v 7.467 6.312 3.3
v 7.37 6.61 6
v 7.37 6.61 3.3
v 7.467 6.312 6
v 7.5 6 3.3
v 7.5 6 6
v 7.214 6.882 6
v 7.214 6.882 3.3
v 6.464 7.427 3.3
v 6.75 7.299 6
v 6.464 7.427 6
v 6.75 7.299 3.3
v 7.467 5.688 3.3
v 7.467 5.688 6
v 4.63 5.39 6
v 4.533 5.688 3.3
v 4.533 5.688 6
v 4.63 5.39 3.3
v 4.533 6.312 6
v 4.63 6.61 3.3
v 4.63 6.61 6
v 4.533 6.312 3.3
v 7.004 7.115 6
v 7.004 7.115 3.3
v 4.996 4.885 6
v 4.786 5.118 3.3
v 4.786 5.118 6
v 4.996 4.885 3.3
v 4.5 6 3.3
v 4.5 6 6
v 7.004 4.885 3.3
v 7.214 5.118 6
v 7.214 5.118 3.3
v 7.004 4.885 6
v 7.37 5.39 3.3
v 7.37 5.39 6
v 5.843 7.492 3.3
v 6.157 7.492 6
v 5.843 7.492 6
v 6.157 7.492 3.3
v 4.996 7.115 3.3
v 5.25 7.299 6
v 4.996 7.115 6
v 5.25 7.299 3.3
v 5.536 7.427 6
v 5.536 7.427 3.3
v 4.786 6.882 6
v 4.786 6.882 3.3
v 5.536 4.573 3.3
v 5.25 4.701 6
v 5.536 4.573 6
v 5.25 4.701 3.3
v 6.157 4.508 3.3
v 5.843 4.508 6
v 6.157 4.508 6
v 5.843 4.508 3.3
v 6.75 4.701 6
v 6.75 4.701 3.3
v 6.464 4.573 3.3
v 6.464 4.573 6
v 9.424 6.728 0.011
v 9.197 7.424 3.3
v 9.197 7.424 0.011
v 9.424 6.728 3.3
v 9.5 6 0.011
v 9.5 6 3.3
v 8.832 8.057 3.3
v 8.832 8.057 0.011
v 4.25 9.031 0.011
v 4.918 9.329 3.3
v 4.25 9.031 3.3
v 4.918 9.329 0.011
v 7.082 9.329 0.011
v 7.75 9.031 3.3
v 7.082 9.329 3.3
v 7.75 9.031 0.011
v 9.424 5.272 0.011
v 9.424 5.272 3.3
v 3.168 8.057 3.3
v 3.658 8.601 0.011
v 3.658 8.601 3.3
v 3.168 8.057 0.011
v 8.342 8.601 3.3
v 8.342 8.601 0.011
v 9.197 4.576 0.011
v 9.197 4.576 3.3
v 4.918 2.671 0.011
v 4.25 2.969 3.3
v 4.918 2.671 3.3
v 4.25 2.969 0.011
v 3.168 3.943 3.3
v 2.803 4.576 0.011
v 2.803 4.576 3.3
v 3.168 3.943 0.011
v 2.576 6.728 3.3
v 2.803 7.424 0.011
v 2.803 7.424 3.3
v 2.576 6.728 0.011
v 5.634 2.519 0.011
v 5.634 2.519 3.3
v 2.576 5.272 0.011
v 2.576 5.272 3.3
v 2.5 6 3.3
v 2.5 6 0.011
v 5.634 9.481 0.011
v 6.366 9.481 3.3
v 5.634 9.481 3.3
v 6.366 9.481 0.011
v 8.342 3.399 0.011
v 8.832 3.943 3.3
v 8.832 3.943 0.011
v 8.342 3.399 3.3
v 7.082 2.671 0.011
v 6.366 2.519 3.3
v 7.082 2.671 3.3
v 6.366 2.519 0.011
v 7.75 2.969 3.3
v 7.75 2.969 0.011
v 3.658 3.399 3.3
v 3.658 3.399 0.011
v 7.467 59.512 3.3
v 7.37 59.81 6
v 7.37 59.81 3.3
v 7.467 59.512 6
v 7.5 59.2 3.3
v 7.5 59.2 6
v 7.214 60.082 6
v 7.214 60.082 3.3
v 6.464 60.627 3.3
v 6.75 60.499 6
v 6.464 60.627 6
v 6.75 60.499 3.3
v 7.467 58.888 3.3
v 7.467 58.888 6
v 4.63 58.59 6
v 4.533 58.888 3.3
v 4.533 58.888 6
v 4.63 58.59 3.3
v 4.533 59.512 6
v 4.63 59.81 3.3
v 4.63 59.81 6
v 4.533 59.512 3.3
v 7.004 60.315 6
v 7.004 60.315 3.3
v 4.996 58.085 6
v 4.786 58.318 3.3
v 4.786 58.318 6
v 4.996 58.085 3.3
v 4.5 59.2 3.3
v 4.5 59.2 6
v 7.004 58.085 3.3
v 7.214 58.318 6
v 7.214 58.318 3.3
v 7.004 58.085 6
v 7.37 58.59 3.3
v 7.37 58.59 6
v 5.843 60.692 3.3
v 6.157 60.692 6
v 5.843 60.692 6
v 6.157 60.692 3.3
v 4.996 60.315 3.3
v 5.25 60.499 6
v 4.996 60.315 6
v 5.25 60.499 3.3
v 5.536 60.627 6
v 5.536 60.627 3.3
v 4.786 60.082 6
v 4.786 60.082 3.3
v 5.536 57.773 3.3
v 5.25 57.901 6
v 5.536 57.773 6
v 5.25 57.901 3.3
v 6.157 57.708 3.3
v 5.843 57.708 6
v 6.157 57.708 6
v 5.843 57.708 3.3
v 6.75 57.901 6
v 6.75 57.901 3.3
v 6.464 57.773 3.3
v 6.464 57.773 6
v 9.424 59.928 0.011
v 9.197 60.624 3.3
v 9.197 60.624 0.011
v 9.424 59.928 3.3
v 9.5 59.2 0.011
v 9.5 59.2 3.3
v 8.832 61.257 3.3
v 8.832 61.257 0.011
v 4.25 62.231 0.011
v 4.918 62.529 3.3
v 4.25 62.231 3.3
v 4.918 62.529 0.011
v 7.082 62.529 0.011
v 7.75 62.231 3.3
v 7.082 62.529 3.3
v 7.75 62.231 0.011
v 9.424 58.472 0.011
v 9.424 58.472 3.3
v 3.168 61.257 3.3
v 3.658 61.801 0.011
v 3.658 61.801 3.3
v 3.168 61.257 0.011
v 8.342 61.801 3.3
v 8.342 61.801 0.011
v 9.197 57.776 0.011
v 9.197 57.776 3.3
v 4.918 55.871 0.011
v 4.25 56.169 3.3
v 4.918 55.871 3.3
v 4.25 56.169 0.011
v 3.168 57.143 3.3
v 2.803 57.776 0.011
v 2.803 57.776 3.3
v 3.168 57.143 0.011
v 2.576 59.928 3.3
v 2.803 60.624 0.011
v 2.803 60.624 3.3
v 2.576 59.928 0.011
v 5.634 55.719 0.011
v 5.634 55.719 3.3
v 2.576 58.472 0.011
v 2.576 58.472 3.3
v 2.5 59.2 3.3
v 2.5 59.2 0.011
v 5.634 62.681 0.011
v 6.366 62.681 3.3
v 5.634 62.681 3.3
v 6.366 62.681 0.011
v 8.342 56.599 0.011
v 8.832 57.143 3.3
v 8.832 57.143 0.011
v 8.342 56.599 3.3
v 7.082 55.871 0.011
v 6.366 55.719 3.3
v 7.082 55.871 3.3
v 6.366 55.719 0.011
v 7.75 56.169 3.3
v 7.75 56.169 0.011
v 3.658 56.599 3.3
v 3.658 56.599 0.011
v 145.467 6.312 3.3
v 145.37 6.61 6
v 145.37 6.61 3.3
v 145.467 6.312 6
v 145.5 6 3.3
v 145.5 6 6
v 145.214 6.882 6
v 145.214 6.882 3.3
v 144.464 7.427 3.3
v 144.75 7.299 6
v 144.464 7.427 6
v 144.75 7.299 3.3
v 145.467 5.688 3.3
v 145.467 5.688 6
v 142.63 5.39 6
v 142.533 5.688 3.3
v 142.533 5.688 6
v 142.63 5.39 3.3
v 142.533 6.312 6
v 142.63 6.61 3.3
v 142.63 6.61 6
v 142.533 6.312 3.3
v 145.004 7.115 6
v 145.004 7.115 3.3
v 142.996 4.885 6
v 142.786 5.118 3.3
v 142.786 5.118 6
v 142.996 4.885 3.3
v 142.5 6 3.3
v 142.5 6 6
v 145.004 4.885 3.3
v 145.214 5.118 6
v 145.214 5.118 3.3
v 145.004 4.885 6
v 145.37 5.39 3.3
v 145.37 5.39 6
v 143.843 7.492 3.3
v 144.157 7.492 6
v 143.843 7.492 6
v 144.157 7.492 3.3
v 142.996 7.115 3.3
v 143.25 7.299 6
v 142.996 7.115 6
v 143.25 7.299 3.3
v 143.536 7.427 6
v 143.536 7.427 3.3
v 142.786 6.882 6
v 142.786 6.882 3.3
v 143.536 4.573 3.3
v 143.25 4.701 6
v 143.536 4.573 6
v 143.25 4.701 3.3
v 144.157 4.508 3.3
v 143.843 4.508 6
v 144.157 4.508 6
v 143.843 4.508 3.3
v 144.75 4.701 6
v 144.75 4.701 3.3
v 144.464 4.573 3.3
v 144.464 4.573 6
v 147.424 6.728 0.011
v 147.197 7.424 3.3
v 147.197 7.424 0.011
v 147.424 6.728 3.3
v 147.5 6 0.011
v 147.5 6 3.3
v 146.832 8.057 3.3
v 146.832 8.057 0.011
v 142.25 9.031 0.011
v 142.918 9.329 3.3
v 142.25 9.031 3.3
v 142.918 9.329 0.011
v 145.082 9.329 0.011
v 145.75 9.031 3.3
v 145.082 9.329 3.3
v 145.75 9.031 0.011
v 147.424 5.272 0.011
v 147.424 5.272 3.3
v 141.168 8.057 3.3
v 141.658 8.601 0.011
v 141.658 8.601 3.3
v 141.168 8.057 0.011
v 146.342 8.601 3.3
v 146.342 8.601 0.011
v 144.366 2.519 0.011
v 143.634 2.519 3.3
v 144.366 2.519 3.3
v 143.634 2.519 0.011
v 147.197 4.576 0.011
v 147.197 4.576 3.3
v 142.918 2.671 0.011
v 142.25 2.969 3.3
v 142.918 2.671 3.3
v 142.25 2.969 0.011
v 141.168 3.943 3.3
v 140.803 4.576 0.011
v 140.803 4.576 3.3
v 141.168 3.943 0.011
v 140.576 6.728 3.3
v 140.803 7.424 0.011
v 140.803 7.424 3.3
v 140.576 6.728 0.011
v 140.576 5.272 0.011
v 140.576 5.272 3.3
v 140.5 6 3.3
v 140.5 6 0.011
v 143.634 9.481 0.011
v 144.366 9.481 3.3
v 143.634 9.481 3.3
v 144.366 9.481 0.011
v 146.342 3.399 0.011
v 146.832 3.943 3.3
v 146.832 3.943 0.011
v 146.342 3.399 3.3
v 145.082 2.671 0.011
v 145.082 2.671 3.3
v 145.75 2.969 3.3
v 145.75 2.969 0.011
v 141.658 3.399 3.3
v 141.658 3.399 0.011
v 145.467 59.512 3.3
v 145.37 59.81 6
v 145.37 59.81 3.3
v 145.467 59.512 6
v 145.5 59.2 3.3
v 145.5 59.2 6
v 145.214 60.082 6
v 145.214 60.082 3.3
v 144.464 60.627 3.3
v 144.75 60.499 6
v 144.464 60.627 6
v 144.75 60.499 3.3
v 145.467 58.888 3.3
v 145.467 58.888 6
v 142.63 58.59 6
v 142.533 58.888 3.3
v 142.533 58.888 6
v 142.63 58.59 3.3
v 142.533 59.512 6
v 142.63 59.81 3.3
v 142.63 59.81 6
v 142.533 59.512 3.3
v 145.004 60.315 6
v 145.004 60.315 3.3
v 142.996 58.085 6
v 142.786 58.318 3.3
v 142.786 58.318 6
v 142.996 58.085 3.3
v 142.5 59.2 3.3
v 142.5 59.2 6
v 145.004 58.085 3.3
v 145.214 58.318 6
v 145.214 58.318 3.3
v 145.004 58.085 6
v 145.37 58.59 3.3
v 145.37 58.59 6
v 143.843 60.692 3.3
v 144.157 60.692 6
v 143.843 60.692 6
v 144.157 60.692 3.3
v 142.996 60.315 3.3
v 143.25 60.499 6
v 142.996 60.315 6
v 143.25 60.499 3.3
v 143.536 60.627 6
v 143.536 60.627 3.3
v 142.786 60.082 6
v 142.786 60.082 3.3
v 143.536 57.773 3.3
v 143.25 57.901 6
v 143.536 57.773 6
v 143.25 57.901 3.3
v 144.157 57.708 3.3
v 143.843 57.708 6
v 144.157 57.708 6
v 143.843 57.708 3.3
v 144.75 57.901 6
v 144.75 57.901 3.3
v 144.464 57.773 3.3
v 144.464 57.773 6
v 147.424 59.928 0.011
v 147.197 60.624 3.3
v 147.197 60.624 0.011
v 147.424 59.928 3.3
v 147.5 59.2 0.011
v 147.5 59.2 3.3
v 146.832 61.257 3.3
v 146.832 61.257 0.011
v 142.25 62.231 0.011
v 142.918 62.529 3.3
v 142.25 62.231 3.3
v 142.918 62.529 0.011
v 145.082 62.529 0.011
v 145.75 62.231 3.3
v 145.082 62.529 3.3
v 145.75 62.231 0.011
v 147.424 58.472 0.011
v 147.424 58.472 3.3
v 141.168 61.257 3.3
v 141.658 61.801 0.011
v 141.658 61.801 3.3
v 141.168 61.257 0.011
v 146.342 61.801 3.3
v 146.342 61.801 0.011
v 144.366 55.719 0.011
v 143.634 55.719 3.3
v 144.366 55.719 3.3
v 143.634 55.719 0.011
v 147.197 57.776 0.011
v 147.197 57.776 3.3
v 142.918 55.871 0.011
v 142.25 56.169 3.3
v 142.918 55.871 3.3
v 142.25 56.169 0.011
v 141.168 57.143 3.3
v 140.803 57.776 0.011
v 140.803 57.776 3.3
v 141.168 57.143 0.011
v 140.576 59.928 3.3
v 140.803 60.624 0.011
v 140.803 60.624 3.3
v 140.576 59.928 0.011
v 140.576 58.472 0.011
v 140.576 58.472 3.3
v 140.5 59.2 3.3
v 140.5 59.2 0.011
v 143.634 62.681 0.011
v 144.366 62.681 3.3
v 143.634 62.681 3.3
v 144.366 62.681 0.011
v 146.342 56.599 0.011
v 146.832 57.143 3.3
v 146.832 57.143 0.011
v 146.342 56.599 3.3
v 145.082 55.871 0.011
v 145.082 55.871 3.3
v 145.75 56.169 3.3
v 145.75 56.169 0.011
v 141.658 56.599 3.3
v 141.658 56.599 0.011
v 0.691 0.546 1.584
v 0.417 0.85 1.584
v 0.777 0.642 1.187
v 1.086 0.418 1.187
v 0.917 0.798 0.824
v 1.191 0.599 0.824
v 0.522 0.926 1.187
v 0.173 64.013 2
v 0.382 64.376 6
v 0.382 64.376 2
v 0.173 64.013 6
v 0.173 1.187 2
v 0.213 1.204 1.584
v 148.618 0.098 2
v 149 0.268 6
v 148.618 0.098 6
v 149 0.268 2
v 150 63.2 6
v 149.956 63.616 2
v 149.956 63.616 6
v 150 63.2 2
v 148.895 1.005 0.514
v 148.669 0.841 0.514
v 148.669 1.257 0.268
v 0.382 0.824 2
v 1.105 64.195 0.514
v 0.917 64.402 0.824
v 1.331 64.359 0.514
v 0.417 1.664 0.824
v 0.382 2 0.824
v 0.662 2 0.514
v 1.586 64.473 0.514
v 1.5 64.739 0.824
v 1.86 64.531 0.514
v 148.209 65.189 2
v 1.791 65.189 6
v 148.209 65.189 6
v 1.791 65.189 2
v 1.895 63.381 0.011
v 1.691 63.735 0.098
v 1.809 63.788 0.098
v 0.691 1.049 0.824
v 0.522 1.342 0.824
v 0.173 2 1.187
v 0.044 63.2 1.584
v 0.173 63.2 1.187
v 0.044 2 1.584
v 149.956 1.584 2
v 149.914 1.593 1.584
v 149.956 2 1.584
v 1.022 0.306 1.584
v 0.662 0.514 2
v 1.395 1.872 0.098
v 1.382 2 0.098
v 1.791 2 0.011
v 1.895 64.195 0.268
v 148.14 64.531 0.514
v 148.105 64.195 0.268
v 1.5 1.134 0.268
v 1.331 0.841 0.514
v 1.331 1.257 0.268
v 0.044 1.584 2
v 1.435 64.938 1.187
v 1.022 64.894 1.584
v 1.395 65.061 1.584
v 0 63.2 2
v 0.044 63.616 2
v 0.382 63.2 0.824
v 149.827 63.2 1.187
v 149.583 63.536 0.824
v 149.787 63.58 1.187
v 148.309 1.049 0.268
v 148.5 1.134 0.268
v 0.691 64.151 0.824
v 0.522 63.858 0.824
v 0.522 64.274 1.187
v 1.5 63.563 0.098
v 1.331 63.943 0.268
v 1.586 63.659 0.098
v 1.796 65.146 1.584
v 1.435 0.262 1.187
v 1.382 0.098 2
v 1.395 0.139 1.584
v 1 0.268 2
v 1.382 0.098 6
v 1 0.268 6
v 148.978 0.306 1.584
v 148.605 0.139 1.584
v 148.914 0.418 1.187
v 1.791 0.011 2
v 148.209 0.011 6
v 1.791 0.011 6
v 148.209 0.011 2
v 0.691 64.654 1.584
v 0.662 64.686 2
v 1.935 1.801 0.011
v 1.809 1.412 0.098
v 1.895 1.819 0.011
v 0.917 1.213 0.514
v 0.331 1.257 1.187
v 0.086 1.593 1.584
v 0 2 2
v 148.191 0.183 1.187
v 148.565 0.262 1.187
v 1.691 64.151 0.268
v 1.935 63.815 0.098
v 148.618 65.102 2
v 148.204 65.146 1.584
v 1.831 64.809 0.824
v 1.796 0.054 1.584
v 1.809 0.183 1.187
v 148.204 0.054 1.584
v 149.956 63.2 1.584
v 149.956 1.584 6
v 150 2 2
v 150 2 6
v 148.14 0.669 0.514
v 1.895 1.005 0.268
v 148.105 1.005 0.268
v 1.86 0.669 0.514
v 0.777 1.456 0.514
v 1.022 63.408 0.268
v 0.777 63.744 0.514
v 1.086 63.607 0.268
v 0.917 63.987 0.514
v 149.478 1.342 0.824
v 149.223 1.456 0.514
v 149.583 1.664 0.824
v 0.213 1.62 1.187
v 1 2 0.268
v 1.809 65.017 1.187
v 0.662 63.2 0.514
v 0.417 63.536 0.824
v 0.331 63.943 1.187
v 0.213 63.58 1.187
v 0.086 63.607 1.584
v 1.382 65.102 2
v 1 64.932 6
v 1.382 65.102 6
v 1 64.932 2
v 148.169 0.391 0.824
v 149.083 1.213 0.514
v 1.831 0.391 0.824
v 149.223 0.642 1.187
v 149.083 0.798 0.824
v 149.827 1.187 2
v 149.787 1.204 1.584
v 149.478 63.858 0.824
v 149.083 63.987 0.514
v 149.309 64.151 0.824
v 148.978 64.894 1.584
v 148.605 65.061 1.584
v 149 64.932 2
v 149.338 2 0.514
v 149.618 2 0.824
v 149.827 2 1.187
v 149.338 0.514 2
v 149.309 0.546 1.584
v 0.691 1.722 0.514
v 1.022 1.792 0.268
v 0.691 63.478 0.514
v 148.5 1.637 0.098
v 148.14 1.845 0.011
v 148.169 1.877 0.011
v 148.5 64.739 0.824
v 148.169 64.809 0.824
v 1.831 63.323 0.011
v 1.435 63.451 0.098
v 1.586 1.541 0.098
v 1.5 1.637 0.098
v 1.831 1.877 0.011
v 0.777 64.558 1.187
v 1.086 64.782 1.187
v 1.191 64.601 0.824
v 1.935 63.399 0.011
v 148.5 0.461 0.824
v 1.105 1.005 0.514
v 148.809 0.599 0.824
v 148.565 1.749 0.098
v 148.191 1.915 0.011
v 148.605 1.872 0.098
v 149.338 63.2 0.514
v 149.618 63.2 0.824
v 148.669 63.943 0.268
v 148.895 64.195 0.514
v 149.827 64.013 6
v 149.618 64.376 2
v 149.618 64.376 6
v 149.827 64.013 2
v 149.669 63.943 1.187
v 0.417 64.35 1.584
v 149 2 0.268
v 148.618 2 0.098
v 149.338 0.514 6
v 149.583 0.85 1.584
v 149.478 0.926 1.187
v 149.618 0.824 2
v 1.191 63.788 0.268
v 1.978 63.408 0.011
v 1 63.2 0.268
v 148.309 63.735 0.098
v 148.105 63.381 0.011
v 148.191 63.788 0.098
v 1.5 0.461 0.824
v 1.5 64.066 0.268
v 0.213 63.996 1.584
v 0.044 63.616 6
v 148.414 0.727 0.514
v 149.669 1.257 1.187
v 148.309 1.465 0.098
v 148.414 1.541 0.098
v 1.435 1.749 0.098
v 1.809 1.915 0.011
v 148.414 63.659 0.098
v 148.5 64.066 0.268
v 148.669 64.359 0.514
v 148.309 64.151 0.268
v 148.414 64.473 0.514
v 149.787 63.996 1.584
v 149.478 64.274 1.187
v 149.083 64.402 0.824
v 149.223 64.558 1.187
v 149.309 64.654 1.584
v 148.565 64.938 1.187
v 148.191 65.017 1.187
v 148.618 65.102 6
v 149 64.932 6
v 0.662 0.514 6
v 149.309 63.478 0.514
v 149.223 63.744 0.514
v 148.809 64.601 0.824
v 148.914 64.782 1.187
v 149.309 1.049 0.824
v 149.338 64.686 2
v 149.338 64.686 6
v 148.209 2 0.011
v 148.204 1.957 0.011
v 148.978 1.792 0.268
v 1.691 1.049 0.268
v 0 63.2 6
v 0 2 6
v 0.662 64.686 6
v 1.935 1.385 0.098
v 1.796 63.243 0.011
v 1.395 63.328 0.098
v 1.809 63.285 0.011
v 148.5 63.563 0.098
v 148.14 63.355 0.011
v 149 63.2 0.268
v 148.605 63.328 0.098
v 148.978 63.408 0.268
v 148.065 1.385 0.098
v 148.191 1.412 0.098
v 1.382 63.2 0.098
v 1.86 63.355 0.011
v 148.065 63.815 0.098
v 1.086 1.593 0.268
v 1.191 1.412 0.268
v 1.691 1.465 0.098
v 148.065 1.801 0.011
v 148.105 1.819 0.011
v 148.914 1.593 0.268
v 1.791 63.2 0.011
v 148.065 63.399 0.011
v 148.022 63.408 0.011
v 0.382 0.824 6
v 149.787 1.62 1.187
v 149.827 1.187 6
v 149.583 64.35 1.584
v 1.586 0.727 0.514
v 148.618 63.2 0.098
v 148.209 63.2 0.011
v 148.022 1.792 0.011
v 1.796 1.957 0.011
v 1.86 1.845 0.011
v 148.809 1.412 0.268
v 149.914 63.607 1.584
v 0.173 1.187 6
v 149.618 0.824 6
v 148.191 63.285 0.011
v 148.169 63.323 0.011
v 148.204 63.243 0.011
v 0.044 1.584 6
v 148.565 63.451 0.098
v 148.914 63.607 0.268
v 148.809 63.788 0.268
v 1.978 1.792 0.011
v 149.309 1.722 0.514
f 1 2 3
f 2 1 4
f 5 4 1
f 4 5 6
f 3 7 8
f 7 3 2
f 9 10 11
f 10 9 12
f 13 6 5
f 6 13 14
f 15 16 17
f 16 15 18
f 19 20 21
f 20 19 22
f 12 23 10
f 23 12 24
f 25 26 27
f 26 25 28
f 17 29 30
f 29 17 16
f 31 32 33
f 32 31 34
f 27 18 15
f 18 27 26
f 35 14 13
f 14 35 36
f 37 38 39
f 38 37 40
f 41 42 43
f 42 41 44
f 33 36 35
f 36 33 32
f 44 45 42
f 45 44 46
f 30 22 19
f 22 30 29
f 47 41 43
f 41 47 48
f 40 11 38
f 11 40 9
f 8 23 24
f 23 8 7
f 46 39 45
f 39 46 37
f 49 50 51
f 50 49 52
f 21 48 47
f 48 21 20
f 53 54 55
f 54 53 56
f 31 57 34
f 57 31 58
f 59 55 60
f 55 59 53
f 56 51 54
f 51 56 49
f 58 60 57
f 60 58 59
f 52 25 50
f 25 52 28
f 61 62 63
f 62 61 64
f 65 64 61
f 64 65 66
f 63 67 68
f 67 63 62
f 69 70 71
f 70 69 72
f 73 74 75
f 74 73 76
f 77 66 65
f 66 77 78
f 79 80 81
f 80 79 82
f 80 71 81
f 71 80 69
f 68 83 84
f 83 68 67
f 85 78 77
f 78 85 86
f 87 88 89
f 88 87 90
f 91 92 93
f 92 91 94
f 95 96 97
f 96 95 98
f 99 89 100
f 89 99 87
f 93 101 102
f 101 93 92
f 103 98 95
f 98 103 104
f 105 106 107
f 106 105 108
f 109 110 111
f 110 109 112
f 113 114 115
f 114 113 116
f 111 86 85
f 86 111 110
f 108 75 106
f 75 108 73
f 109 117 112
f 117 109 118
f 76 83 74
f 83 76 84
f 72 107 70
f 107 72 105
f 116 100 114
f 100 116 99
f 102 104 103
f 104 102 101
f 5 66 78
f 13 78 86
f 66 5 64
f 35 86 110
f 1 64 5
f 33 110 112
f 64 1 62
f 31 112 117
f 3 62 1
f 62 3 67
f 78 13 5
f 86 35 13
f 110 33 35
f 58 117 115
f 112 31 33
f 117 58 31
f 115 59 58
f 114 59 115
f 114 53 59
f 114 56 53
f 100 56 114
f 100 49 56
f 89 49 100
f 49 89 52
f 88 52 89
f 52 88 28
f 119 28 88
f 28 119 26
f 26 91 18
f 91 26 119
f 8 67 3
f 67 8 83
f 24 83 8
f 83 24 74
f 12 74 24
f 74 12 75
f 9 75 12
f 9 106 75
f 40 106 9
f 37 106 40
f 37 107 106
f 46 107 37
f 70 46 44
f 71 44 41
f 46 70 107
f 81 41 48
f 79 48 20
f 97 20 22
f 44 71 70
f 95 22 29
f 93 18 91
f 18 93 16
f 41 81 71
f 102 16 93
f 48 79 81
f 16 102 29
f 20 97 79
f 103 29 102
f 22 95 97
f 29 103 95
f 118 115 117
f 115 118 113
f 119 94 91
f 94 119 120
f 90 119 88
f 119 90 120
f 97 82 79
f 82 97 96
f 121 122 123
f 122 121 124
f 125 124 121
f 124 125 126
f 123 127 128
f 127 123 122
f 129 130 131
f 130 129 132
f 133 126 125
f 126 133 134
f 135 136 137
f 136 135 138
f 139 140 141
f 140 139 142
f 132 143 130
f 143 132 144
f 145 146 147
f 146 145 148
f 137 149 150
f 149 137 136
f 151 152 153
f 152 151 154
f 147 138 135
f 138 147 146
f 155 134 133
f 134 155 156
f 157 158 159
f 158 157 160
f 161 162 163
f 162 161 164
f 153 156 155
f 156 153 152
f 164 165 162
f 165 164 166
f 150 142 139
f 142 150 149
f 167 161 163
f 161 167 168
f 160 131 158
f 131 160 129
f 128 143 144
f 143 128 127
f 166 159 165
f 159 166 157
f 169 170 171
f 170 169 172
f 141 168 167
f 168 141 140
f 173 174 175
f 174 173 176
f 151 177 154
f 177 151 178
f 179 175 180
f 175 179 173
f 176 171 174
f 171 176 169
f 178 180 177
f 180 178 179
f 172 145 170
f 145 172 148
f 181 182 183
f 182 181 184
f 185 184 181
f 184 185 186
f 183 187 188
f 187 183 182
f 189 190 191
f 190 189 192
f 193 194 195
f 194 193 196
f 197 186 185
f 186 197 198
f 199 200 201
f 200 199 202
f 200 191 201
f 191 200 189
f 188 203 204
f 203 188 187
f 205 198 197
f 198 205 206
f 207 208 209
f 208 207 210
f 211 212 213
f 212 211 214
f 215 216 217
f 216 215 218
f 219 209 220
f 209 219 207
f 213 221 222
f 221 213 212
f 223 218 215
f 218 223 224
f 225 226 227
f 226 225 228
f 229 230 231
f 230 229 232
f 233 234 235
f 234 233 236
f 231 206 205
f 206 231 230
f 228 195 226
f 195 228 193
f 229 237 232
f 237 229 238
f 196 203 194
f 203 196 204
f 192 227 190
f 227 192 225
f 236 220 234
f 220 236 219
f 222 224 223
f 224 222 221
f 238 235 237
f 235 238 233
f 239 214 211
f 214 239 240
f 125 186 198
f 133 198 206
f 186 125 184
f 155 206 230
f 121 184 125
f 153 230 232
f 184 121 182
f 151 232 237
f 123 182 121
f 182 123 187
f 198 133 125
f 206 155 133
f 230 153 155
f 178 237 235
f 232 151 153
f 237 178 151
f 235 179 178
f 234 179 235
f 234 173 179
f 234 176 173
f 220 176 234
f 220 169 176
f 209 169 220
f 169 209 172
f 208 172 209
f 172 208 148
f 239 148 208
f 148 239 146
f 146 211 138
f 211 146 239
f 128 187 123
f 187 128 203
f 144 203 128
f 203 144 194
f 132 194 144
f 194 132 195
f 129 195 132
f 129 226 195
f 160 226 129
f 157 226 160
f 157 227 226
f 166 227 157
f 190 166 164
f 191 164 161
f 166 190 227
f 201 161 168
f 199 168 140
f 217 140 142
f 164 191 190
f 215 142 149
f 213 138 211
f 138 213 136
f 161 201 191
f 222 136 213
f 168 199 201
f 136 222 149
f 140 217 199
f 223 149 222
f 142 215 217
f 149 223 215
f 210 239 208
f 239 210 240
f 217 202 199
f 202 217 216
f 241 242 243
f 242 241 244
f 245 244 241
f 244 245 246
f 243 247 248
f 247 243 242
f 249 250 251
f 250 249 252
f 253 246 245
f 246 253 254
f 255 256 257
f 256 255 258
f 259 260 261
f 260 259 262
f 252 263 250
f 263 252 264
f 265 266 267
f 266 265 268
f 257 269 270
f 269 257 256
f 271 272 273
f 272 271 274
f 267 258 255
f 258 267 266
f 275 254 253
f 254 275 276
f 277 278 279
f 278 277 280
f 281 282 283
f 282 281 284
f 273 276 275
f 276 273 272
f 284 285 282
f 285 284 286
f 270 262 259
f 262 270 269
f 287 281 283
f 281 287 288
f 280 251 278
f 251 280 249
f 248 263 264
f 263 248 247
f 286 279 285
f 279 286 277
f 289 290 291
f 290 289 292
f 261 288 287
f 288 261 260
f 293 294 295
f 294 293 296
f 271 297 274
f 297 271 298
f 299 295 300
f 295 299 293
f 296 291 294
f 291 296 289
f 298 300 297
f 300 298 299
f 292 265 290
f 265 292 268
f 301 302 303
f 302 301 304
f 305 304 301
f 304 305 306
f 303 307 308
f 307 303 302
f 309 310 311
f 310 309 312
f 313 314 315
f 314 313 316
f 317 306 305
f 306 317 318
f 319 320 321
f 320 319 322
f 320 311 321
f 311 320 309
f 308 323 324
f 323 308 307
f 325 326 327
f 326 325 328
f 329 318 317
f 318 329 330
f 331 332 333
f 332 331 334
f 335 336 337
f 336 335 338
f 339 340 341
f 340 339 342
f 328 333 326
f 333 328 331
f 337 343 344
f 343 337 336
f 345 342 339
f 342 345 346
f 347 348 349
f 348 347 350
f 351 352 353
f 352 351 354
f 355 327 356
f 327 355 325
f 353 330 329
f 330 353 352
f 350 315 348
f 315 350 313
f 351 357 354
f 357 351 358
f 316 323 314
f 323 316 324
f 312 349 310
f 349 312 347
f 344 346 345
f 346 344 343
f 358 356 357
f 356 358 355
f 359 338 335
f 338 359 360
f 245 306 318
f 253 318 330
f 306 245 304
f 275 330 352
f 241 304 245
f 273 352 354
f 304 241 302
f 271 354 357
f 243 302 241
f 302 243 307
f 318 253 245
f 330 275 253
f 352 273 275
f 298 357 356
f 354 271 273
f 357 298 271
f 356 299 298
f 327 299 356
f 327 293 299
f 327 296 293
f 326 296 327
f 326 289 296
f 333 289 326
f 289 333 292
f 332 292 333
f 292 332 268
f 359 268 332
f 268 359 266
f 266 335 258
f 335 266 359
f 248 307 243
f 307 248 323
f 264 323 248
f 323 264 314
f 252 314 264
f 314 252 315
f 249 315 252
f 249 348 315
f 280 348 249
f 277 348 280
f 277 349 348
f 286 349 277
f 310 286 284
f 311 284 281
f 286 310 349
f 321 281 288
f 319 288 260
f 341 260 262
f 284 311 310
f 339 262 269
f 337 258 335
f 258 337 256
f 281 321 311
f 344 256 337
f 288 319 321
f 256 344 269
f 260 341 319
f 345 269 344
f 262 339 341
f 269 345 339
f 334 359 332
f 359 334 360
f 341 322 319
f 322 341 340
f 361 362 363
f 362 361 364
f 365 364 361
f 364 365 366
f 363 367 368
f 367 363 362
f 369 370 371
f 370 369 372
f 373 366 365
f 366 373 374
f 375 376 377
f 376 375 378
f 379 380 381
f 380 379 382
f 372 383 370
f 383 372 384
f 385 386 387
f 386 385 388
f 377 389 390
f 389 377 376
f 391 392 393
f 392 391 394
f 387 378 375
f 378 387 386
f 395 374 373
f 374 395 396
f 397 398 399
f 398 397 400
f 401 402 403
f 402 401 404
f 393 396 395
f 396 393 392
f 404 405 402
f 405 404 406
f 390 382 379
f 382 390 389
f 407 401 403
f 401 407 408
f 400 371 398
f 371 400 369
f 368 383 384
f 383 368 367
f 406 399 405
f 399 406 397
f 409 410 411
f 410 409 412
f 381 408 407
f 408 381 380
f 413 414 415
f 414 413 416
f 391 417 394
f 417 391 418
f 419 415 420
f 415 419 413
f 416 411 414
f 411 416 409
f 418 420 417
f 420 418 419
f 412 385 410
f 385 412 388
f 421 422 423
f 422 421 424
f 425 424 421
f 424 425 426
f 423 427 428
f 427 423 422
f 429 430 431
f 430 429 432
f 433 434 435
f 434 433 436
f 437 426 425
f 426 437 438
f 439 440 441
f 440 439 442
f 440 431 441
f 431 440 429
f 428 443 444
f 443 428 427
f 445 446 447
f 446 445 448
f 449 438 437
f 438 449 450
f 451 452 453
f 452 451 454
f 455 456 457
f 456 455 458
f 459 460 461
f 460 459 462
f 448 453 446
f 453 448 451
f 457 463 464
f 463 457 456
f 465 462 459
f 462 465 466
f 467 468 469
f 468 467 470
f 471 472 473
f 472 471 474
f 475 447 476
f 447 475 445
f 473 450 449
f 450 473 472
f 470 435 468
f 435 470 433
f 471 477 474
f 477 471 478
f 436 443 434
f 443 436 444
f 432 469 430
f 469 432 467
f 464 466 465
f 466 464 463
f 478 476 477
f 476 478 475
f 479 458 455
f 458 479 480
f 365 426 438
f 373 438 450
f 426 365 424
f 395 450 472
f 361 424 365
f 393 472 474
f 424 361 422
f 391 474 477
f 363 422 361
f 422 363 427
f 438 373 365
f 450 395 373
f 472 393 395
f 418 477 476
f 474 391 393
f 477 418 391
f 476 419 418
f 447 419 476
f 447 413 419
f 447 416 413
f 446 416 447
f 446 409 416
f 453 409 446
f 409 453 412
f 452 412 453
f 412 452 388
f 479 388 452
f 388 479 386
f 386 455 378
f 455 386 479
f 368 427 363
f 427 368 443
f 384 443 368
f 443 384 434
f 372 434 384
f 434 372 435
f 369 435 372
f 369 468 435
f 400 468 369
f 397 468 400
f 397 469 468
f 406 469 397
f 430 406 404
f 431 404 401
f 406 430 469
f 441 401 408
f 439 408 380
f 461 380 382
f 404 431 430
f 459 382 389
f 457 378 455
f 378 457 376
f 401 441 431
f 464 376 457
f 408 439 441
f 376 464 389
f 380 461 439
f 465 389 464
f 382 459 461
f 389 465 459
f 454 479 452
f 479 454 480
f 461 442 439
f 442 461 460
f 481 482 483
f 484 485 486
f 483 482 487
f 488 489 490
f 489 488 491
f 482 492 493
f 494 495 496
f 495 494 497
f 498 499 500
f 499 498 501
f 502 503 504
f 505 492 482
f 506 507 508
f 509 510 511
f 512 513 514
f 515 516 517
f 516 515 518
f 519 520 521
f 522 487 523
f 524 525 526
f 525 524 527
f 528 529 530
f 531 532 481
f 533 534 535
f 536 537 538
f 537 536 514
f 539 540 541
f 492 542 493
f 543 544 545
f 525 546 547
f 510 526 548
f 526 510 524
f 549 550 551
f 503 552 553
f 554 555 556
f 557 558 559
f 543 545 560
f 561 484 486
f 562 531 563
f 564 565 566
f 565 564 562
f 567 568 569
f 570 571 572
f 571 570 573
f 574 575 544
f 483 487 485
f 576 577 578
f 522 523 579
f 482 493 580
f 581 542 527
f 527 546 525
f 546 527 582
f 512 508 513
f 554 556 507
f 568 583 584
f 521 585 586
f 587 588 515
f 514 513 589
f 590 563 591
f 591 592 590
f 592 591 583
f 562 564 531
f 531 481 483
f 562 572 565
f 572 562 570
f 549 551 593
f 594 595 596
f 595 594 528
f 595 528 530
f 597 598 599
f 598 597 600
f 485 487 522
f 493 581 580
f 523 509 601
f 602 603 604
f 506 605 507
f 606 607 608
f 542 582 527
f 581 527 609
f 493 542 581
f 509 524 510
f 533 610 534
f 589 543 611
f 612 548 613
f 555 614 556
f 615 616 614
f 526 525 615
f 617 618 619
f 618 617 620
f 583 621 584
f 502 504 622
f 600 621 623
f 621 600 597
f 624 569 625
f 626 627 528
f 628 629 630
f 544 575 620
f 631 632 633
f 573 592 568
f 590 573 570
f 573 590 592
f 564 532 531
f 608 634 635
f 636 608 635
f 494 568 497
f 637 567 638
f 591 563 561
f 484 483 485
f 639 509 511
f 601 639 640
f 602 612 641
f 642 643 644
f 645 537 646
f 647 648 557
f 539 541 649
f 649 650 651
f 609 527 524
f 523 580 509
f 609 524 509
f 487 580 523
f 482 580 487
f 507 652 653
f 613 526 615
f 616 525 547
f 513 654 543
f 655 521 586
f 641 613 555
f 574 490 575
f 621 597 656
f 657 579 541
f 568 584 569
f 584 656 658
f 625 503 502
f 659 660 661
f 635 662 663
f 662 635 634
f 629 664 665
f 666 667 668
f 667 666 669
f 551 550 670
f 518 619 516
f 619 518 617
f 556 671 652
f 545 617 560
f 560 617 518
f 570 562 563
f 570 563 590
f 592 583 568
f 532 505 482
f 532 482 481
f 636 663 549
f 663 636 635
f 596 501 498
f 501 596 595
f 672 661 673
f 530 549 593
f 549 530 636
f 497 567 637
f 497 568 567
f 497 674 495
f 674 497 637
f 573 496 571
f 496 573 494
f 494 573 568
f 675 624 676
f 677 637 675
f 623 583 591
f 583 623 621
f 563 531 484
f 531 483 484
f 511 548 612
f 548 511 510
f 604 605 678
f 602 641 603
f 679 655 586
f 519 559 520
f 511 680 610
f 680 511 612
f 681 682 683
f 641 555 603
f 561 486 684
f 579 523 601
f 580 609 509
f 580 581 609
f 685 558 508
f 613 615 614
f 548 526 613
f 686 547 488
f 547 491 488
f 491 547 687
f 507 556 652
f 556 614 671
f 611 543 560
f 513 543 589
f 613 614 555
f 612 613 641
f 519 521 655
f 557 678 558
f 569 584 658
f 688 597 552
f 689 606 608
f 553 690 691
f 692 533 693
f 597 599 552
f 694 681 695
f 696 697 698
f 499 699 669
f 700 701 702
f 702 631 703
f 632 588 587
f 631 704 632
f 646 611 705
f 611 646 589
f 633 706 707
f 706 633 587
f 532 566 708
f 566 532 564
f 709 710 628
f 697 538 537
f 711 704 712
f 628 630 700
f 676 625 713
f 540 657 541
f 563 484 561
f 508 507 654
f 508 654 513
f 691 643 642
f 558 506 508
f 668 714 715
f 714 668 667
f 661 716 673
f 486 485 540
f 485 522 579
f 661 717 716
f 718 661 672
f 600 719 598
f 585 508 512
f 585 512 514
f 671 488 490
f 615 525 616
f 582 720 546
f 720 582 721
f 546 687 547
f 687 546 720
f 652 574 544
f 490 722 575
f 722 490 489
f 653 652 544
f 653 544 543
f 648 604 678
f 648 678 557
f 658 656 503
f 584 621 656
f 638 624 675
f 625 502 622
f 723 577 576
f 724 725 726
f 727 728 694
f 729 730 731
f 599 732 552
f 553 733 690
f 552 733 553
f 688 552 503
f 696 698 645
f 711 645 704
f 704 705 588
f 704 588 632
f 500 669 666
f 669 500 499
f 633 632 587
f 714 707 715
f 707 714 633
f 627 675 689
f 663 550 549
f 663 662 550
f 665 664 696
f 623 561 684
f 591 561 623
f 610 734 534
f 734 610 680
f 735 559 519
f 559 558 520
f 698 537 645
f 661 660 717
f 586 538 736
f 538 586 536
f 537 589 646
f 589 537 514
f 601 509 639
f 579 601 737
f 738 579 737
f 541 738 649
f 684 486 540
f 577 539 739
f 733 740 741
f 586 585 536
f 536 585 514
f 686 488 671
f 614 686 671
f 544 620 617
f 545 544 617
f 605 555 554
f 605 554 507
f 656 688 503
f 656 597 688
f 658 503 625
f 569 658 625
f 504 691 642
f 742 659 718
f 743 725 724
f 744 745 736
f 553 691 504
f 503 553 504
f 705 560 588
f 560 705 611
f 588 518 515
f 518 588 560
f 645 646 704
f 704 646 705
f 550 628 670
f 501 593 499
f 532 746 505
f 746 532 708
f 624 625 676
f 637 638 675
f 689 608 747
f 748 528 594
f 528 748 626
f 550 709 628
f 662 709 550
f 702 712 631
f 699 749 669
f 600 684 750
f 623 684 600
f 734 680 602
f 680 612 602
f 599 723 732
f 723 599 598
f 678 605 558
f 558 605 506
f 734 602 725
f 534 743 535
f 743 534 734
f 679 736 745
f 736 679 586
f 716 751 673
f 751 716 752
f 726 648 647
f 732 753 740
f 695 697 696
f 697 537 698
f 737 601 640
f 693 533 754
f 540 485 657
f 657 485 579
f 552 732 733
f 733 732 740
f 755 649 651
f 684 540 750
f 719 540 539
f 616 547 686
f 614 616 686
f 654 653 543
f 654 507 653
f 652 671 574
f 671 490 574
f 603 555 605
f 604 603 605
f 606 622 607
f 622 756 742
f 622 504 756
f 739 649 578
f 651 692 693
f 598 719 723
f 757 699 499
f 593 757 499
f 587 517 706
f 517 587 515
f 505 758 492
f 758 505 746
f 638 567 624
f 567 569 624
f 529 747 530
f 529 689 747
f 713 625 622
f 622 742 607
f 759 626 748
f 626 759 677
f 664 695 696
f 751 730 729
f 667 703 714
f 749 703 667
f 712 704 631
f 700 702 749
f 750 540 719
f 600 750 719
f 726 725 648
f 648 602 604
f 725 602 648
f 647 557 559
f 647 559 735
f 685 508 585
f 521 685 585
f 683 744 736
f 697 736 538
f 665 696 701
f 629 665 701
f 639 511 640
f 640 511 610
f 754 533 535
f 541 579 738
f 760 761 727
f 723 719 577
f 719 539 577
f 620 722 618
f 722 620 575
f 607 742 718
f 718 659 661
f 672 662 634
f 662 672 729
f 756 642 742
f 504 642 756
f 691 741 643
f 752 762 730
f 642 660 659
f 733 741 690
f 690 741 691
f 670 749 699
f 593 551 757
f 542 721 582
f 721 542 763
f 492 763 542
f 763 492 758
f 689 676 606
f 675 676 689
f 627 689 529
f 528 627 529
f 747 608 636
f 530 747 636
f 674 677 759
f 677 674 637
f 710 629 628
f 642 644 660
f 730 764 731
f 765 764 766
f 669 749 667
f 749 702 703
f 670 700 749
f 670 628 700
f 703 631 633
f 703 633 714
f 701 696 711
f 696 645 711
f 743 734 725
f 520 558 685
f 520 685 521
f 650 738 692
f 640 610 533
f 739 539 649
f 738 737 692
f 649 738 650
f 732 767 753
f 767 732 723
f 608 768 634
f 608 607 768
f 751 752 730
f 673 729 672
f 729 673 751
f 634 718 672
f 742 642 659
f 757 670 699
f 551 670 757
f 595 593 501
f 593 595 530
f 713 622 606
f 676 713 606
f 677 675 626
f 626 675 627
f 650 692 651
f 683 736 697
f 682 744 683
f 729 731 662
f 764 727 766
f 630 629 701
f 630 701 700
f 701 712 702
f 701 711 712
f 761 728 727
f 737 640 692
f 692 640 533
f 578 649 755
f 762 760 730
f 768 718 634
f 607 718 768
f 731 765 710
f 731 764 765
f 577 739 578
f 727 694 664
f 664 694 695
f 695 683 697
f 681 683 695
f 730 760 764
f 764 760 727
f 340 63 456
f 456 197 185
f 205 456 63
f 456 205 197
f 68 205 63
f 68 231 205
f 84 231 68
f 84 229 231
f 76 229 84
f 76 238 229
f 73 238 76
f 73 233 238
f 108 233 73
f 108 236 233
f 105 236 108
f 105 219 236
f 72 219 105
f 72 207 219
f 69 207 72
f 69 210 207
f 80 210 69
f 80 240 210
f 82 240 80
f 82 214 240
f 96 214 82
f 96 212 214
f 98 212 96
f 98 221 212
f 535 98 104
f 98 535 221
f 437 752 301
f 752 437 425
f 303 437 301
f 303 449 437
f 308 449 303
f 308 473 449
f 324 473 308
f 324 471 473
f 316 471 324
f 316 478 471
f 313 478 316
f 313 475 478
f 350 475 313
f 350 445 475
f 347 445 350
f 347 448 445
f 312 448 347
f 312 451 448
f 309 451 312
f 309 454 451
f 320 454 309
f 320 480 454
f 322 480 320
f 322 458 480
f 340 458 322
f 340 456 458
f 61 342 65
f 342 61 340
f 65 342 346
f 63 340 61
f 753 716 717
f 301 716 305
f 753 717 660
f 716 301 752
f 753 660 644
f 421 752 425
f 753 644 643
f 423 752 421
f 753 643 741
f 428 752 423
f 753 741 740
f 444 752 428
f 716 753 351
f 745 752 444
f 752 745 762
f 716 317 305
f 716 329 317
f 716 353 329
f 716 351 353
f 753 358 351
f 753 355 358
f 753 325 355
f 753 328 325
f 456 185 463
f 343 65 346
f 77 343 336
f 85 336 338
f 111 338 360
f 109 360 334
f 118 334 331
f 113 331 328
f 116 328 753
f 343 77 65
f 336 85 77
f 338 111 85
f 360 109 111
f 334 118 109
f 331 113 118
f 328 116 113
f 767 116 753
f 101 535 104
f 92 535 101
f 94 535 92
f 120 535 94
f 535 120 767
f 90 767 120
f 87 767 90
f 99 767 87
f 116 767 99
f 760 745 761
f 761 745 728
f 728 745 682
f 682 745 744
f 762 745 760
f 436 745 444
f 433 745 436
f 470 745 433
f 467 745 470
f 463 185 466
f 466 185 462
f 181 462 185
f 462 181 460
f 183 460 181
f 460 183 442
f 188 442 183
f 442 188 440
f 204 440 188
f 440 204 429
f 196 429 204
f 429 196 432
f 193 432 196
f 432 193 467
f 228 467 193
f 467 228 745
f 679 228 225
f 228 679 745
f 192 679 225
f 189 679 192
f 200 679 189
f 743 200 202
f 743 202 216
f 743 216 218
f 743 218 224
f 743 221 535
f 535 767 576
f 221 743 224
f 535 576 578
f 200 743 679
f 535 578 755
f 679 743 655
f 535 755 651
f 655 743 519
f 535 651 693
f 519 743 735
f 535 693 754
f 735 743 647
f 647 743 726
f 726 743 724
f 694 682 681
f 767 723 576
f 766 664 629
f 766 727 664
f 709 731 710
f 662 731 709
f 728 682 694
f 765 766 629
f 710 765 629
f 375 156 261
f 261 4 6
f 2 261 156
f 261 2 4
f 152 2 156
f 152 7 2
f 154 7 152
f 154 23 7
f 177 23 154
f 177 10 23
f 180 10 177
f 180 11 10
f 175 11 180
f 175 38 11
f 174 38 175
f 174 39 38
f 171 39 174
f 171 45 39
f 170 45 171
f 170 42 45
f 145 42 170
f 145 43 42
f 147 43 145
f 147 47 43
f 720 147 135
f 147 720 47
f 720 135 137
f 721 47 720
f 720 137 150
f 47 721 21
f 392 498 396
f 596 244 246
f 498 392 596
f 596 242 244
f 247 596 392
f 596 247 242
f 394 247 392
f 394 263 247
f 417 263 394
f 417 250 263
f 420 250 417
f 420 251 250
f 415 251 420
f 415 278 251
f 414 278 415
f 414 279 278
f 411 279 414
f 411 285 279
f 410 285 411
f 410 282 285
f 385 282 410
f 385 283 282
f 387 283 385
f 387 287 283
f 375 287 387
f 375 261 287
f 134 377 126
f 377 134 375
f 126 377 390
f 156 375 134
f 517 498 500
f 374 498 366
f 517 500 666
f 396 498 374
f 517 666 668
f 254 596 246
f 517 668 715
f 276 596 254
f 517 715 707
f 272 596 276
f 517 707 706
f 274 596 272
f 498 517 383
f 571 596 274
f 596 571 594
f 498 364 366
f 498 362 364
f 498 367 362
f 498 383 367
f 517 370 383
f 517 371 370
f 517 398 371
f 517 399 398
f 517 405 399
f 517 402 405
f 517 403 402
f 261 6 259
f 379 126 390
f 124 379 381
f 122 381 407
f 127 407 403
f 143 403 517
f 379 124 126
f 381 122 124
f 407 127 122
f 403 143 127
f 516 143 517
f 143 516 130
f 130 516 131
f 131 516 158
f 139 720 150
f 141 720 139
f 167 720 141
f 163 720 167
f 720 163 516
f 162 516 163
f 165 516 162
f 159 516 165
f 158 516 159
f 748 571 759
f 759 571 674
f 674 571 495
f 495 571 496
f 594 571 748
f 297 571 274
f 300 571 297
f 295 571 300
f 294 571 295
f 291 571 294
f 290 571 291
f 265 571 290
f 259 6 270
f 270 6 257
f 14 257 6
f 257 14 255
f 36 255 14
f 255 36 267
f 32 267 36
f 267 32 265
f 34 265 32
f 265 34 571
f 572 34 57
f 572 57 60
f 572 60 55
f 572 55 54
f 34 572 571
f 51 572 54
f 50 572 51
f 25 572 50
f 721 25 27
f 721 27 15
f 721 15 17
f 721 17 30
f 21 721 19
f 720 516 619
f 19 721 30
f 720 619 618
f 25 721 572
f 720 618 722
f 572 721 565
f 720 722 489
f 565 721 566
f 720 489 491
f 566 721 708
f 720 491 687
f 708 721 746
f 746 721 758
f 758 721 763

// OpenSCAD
// file: lib/roundedcube.scad
// Source: https://danielupshaw.com/openscad-rounded-corners/
// Higher definition curves
$fs = 0.01;

module roundedcube(size = [1, 1, 1], center = false, radius = 0.5, apply_to = "all") {
	// If single value, convert to [x, y, z] vector
	size = (size[0] == undef) ? [size, size, size] : size;

	translate_min = radius;
	translate_xmax = size[0] - radius;
	translate_ymax = size[1] - radius;
	translate_zmax = size[2] - radius;

	diameter = radius * 2;

	module build_point(type = "sphere", rotate = [0, 0, 0]) {
		if (type == "sphere") {
			sphere(r = radius);
		} else if (type == "cylinder") {
			rotate(a = rotate)
			cylinder(h = diameter, r = radius, center = true);
		}
	}

	obj_translate = (center == false) ?
		[0, 0, 0] : [
			-(size[0] / 2),
			-(size[1] / 2),
			-(size[2] / 2)
		];

	translate(v = obj_translate) {
		hull() {
			for (translate_x = [translate_min, translate_xmax]) {
				x_at = (translate_x == translate_min) ? "min" : "max";
				for (translate_y = [translate_min, translate_ymax]) {
					y_at = (translate_y == translate_min) ? "min" : "max";
					for (translate_z = [translate_min, translate_zmax]) {
						z_at = (translate_z == translate_min) ? "min" : "max";

						translate(v = [translate_x, translate_y, translate_z])
						if (
							(apply_to == "all") ||
							(apply_to == "xmin" && x_at == "min") || (apply_to == "xmax" && x_at == "max") ||
							(apply_to == "ymin" && y_at == "min") || (apply_to == "ymax" && y_at == "max") ||
							(apply_to == "zmin" && z_at == "min") || (apply_to == "zmax" && z_at == "max")
						) {
							build_point("sphere");
						} else {
							rotate = 
								(apply_to == "xmin" || apply_to == "xmax" || apply_to == "x") ? [0, 90, 0] : (
								(apply_to == "ymin" || apply_to == "ymax" || apply_to == "y") ? [90, 90, 0] :
								[0, 0, 0]
							);
							build_point("cylinder", rotate);
						}
					}
				}
			}
		}
	}
}
// file: common.scad
CORNER_RADIUS = 2;
PANEL_THICKNESS = 1.6;
WIDTH = 150;
INNER_HEIGHT = 62;  // The length of the Teensy board
HEIGHT = INNER_HEIGHT + 2 * PANEL_THICKNESS;

SCREW_HEAD = 3.5; // radius of widest part of screw
SCREW_SHAFT = 1.5; // radius of shaft of screw
SCREW_POSITION_OFFSET = 6;
SCREW_DEPTH = 4;
SCREW1_X = SCREW_POSITION_OFFSET;        SCREW1_Y = SCREW_POSITION_OFFSET;
SCREW2_X = SCREW_POSITION_OFFSET;        SCREW2_Y = HEIGHT- SCREW_POSITION_OFFSET;
SCREW3_X = WIDTH-SCREW_POSITION_OFFSET;  SCREW3_Y = SCREW_POSITION_OFFSET;
SCREW4_X = WIDTH-SCREW_POSITION_OFFSET;  SCREW4_Y = HEIGHT-SCREW_POSITION_OFFSET;

//FIXME 
$fn = 30;
// main file
// Back plate for revolcer project box
// Uses M3x8 screws with washers and lockwashers

include <common.scad>
use <lib/roundedcube.scad>

PLATE_THICKNESS = 6;
SCREW_RECESS_DEPTH = 3.3;

module screw_hole(x, y) {
    // a hole for a recessed screw at x, y
    translate([x, y, 0]) {
        cylinder(h=100, r=SCREW_SHAFT);
        cylinder(h=SCREW_RECESS_DEPTH, r=SCREW_HEAD);
    }
}

module back_panel() {
    // holes
    difference() {
        // base plate
        roundedcube(size=[WIDTH, HEIGHT, PLATE_THICKNESS+CORNER_RADIUS], radius=CORNER_RADIUS);
        translate([0, 0, PLATE_THICKNESS]) cube([WIDTH, HEIGHT, 100]);

        screw_hole(SCREW1_X, SCREW1_Y);
        screw_hole(SCREW2_X, SCREW2_Y);
        screw_hole(SCREW3_X, SCREW3_Y);
        screw_hole(SCREW4_X, SCREW4_Y);
    }
}

back_panel();

// TEST code
//intersection() {
//    back_panel();
//    translate([0, 0, -100]) cube([20,20,1000]);
//}
